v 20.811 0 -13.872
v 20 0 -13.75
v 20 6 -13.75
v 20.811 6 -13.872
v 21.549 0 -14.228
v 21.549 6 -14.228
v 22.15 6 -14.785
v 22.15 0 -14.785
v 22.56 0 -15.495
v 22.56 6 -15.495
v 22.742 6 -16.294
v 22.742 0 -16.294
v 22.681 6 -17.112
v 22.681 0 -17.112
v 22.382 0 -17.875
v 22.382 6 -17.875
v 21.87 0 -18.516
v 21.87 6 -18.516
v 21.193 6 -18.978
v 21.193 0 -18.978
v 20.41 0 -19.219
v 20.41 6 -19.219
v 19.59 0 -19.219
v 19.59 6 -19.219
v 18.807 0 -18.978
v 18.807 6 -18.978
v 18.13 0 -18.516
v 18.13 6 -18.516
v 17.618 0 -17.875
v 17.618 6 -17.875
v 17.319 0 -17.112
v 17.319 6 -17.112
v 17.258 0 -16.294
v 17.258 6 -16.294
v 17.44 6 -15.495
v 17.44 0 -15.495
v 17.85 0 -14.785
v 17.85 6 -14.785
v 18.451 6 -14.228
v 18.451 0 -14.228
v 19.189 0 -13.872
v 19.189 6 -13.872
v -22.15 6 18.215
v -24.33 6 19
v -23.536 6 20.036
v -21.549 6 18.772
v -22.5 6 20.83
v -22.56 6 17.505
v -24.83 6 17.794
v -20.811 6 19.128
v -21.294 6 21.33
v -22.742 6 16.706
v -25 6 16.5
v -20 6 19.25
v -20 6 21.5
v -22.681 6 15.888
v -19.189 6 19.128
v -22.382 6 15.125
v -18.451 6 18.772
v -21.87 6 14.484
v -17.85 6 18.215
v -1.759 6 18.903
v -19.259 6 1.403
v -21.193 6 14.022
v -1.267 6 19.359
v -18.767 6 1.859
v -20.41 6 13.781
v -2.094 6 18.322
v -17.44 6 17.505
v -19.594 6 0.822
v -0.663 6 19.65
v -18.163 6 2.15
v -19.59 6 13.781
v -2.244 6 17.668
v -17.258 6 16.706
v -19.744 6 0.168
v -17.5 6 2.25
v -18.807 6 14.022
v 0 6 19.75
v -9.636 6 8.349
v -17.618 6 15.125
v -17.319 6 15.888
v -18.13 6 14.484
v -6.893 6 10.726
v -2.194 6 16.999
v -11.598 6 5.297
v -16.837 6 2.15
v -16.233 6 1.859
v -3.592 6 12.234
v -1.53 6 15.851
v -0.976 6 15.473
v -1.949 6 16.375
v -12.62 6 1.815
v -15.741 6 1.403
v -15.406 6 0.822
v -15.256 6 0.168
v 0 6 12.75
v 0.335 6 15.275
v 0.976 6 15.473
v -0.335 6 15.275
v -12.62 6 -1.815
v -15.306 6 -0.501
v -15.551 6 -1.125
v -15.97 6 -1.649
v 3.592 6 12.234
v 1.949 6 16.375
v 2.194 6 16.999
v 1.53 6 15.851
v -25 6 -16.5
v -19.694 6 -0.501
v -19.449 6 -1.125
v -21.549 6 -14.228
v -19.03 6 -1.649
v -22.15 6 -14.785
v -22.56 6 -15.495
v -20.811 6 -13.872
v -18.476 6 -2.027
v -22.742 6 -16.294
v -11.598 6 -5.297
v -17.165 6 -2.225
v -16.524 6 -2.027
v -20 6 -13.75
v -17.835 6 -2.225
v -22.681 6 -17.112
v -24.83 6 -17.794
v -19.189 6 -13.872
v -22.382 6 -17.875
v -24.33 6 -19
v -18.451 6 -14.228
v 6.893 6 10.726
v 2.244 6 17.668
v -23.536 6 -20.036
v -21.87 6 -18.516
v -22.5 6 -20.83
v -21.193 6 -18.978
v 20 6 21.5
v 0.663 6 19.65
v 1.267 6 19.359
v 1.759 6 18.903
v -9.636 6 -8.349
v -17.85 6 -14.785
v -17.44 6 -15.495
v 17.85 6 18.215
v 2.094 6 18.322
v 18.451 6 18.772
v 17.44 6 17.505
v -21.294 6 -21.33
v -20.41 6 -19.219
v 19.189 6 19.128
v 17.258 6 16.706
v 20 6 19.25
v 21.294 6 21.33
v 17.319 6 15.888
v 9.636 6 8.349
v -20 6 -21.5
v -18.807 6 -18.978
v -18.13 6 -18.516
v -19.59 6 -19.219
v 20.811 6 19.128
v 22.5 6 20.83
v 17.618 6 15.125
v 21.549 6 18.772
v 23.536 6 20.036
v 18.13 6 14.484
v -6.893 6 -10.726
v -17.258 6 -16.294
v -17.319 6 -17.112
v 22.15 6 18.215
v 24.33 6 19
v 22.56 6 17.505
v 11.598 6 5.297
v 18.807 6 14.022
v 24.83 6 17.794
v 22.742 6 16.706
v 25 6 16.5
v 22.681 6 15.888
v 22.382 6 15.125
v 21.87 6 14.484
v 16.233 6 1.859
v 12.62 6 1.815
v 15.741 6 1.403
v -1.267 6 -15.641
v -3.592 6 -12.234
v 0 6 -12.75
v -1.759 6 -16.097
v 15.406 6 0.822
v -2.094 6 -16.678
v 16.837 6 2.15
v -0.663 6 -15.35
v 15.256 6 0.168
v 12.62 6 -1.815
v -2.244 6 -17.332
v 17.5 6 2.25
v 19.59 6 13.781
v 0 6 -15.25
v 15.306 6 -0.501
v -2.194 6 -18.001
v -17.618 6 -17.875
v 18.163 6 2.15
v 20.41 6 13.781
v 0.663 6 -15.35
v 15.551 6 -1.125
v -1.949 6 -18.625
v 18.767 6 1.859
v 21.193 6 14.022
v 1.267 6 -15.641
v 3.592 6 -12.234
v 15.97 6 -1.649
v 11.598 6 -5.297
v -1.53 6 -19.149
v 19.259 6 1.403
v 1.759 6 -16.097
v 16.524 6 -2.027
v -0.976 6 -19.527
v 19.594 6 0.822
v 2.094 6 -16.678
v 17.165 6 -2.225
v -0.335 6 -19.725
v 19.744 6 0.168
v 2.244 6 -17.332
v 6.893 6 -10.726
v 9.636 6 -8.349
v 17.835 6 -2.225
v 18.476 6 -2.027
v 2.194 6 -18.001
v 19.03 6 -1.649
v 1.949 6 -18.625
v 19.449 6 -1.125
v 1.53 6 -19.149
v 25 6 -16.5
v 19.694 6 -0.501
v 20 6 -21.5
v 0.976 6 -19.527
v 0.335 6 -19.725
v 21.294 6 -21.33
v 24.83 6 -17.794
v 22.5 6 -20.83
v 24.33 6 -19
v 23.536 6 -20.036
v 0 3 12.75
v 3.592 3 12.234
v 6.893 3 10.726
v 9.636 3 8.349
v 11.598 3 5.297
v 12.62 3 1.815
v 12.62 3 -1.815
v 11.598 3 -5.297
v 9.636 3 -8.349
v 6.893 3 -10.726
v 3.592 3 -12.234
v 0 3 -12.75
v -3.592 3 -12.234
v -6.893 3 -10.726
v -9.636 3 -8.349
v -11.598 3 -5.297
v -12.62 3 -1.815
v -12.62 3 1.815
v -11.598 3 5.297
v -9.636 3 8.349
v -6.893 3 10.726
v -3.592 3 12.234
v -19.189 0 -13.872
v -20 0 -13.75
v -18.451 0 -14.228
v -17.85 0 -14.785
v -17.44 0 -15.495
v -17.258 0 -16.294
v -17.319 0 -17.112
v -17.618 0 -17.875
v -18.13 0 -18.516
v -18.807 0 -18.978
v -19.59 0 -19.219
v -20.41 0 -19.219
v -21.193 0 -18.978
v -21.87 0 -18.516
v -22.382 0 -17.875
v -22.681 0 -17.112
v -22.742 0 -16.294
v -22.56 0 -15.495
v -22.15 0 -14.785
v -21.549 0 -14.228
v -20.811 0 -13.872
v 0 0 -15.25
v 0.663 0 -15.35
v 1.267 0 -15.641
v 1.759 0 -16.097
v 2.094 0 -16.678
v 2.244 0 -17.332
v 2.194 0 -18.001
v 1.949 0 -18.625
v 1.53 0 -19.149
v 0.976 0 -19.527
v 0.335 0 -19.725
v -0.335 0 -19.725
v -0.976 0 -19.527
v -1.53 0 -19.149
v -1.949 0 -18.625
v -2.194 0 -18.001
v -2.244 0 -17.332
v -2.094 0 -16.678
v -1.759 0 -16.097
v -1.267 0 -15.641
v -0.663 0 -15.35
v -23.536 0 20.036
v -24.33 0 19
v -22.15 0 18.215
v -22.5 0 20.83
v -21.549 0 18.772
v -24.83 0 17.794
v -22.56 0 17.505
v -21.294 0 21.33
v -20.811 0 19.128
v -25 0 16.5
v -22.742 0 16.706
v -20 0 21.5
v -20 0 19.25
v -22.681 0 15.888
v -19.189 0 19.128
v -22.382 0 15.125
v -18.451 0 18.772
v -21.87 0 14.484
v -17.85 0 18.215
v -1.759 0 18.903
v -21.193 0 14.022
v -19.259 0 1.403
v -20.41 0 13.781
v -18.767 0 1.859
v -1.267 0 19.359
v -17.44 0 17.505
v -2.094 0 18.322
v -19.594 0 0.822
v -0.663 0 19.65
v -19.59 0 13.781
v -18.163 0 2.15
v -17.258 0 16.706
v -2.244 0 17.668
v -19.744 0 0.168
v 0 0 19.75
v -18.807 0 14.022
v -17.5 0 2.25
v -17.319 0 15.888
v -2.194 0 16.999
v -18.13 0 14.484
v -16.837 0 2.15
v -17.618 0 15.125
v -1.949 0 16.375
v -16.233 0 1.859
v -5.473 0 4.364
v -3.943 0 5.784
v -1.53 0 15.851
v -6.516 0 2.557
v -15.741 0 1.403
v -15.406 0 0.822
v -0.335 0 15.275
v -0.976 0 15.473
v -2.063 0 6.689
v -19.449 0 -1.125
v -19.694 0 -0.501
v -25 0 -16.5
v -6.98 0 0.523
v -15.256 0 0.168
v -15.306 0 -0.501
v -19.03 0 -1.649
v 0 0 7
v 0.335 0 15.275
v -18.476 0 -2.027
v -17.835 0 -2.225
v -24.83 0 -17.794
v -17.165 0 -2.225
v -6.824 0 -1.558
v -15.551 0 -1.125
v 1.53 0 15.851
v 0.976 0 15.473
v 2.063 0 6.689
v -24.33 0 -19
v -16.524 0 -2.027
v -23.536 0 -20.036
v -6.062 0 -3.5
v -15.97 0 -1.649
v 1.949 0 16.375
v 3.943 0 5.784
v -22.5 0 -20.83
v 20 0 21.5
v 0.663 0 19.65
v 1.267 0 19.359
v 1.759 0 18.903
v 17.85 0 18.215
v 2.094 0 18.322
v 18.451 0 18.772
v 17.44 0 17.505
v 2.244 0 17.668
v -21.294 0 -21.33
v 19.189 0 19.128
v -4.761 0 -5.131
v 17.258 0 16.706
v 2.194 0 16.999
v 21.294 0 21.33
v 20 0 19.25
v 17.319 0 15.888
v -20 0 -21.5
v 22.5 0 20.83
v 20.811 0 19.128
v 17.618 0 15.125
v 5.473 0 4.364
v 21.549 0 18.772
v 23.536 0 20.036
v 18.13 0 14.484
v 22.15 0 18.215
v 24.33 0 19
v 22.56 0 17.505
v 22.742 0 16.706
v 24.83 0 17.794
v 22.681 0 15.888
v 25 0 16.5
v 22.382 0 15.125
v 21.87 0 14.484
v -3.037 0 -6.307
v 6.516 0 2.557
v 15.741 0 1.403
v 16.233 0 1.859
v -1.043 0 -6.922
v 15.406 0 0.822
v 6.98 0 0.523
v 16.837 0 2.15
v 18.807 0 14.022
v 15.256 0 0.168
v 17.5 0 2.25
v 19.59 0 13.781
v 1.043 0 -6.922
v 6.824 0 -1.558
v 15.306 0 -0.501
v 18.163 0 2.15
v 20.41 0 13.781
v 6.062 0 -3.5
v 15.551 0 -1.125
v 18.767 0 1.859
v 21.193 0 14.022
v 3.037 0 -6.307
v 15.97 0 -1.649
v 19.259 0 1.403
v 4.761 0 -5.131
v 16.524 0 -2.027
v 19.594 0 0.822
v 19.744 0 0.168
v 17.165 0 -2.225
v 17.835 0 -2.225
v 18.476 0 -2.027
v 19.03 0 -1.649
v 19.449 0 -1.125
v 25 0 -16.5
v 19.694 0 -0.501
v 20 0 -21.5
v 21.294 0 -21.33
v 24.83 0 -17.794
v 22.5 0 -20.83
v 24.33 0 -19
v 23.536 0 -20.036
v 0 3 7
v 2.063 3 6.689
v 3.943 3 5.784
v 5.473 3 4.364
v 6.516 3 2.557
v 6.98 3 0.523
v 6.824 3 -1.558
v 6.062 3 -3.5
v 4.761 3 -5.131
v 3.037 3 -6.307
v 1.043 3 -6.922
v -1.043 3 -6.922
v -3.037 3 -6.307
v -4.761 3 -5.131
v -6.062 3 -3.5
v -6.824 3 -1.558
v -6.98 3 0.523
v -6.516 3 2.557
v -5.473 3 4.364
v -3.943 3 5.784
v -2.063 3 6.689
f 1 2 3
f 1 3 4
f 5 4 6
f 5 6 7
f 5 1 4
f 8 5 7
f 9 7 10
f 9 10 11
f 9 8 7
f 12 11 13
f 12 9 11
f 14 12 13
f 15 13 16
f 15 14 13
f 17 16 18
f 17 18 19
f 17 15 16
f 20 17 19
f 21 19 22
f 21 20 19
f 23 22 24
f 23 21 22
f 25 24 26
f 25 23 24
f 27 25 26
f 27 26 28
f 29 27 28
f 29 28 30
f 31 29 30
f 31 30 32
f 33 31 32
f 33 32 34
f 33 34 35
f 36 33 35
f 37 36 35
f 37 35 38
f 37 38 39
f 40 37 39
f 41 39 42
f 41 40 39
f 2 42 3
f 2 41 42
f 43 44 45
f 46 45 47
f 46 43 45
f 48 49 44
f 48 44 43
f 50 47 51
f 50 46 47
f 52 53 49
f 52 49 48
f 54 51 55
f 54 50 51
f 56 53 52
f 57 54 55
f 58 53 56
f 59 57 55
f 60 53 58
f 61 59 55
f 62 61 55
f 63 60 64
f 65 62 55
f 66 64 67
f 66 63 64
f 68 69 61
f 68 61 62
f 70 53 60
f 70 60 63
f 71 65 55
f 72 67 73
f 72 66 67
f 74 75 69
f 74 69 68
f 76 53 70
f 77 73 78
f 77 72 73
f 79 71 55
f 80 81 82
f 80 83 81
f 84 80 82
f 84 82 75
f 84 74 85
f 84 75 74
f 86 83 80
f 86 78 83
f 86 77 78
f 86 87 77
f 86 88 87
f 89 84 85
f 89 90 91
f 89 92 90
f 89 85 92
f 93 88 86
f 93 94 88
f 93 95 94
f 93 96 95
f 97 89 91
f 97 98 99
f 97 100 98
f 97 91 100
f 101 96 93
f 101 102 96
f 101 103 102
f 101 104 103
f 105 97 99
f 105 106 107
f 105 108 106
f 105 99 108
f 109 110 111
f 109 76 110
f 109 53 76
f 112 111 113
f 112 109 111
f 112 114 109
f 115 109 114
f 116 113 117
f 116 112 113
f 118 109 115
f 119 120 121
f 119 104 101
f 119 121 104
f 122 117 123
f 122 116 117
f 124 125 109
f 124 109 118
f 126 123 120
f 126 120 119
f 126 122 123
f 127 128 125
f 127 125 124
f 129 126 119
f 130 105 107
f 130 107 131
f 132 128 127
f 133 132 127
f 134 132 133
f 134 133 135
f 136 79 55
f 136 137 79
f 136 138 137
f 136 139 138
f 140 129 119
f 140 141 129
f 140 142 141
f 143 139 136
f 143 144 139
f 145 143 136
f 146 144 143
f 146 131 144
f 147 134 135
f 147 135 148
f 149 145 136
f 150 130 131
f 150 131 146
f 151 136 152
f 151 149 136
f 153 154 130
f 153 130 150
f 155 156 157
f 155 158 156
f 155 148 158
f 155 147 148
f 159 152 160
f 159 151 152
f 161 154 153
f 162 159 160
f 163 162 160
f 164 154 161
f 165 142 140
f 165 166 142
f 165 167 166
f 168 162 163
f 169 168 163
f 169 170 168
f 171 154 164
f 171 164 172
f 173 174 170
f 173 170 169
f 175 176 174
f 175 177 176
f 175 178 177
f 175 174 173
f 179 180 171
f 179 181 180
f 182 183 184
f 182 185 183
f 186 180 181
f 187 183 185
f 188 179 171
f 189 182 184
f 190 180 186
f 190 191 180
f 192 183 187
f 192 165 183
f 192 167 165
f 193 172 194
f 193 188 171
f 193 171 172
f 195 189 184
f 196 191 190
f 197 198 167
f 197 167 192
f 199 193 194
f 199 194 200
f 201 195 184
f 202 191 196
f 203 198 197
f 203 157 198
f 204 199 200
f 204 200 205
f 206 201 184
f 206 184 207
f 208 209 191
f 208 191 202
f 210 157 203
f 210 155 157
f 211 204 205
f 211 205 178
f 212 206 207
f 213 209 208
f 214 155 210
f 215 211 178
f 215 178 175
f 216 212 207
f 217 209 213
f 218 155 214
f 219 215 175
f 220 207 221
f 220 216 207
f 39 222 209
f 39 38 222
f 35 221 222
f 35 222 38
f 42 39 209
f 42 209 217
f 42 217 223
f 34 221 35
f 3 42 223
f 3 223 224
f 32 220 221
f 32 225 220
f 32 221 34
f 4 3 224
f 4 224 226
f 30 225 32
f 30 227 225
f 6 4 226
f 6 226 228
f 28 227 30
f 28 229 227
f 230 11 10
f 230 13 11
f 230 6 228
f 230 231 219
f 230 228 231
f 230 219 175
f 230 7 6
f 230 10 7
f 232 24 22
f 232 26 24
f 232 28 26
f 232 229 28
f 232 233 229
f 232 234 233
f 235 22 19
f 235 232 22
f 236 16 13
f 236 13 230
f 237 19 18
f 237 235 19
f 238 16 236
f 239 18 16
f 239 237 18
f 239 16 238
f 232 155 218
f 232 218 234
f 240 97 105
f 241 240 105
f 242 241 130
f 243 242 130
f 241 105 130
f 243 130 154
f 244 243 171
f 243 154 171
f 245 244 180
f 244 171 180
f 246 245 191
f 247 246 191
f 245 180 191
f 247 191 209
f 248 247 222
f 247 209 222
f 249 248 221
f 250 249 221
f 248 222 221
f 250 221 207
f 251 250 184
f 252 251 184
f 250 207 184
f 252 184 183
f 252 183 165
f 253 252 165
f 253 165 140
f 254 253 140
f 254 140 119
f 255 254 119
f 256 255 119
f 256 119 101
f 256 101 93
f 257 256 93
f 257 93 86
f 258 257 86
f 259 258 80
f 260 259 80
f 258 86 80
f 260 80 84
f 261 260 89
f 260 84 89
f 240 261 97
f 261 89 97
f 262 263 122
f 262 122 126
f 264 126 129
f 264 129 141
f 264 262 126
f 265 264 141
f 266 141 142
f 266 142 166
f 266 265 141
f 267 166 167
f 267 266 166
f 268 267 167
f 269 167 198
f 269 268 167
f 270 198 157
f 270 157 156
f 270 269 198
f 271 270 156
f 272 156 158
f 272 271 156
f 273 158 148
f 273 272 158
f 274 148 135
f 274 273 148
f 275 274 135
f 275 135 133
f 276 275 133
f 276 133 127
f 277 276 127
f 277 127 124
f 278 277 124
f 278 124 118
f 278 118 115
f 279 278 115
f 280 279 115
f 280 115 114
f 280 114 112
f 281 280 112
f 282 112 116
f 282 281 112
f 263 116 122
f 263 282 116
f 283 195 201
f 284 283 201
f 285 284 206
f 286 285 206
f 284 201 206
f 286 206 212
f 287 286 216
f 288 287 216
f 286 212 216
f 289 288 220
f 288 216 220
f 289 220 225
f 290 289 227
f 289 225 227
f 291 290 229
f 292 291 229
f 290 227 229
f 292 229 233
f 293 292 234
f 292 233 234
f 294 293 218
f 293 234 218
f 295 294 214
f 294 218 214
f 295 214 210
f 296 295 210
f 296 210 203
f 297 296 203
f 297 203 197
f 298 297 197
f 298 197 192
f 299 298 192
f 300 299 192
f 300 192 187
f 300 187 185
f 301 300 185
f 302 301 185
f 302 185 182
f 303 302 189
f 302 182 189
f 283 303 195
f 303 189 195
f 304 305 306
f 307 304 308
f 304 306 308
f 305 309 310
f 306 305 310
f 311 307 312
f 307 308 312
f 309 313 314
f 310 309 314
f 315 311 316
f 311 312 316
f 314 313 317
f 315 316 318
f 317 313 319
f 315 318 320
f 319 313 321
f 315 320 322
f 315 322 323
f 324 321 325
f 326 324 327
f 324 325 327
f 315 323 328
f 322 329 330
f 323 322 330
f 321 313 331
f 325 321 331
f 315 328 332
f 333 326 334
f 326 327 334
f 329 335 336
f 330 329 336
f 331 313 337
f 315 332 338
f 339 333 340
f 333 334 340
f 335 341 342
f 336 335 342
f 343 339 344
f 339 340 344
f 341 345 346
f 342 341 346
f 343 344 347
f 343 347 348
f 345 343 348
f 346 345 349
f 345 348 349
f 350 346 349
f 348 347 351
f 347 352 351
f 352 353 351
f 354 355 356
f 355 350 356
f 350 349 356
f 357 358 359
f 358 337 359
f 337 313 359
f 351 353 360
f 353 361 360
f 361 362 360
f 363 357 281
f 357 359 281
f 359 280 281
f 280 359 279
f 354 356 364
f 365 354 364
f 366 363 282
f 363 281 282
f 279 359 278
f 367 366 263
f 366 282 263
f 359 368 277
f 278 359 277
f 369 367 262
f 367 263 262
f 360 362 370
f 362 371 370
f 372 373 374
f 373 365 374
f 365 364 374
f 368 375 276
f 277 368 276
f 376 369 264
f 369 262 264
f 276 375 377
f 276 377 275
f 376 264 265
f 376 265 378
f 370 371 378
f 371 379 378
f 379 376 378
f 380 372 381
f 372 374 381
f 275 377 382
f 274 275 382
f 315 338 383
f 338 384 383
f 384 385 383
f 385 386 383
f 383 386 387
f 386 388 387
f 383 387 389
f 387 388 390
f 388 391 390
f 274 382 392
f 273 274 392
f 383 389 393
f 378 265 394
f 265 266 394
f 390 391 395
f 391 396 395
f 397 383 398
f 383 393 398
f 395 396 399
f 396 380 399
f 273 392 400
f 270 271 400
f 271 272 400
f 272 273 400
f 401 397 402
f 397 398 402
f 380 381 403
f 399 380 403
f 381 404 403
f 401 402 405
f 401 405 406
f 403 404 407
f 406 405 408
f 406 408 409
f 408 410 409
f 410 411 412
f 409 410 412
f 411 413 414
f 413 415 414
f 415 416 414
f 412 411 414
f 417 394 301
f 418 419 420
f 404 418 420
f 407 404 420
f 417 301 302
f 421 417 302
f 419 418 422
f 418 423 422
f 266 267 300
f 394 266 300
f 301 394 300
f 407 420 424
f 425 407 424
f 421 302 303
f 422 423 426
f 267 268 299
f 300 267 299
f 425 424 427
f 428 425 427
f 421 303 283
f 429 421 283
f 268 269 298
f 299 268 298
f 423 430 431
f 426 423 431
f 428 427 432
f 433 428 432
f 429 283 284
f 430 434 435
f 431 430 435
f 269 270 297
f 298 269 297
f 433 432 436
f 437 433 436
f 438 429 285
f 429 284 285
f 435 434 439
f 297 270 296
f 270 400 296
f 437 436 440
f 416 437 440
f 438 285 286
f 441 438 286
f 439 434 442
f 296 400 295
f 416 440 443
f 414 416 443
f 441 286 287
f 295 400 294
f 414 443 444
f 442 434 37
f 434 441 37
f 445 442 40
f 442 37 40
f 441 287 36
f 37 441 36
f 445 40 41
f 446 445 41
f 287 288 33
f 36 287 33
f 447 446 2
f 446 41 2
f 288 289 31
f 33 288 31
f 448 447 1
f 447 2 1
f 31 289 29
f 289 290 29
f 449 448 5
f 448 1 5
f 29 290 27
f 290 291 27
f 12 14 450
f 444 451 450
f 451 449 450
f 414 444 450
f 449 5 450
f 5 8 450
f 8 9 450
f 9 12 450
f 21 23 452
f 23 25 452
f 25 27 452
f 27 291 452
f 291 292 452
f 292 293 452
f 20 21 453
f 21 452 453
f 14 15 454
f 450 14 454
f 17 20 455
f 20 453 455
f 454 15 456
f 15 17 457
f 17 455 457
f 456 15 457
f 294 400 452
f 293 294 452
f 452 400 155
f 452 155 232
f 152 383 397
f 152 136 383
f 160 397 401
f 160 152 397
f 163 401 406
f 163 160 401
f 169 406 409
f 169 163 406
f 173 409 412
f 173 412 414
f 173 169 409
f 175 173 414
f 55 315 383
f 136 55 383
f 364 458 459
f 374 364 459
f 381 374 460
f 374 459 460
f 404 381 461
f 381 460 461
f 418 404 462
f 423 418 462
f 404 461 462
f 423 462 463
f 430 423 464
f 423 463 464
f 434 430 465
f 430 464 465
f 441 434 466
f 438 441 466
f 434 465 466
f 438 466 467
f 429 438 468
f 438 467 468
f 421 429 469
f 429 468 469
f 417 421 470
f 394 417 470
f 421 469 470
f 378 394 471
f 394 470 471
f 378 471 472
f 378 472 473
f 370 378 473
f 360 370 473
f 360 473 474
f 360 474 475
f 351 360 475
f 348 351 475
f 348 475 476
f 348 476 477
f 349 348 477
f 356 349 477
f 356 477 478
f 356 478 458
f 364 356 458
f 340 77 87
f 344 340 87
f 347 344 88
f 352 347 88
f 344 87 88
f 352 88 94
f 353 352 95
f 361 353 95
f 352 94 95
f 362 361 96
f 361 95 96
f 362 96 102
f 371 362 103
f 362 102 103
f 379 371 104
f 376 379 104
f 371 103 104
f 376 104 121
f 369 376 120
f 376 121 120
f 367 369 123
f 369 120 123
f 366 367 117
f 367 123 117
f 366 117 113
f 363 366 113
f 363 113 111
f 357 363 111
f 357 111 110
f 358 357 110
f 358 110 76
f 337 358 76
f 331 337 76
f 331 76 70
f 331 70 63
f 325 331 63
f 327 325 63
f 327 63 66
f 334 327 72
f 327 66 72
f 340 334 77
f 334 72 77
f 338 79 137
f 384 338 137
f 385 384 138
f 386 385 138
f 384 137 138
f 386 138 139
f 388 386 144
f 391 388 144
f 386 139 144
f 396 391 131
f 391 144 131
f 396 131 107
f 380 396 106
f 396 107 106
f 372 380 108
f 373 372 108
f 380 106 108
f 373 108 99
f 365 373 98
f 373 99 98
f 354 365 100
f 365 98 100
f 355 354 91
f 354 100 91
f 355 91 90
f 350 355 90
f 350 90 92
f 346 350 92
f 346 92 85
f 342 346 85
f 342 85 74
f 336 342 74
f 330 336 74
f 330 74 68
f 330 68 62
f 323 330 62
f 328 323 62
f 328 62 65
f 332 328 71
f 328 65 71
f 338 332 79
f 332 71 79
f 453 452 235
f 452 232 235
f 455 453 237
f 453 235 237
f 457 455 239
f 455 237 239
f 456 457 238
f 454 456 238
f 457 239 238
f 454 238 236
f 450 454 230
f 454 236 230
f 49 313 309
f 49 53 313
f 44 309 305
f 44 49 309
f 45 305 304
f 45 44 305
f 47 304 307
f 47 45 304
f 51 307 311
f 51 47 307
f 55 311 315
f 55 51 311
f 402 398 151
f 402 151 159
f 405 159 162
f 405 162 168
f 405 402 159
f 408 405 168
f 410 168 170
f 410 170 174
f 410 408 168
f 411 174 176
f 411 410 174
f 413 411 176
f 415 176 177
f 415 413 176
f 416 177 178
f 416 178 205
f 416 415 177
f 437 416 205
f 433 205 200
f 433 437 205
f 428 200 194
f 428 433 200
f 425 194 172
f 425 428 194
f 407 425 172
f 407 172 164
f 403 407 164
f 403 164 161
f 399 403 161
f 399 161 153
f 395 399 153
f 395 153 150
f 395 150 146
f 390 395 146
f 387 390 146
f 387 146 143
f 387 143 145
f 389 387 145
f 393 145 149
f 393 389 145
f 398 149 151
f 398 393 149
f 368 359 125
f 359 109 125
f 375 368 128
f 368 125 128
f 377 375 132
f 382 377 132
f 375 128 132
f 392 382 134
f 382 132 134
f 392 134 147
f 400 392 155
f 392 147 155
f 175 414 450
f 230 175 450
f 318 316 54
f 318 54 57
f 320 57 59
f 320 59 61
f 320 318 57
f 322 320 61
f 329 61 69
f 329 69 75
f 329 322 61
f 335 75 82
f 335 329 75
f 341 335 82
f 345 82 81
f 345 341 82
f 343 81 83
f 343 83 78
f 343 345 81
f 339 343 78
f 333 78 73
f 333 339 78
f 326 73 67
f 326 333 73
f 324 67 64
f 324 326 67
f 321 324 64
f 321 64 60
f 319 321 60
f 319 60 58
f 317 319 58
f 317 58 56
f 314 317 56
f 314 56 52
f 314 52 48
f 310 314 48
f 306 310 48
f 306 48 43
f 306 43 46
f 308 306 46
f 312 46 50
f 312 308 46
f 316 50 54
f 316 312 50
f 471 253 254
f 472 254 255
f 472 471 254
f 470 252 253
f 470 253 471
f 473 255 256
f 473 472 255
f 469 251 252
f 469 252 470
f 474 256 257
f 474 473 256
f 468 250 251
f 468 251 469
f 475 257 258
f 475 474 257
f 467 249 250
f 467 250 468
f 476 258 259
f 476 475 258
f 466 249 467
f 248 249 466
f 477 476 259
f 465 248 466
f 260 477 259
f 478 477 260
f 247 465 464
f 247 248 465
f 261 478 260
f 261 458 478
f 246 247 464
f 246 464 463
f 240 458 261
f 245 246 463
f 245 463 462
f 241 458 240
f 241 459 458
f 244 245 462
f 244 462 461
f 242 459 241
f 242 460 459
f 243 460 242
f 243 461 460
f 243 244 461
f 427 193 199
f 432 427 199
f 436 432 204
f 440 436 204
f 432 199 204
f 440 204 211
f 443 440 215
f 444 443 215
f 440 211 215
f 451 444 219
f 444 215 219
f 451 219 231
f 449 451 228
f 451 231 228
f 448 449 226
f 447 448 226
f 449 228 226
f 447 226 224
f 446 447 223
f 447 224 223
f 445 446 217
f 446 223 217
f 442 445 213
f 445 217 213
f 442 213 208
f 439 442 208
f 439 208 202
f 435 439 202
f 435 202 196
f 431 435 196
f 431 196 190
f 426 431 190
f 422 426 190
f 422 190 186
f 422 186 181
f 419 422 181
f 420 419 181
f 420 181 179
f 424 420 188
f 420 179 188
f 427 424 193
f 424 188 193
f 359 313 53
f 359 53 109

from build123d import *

# Parameters (mm, degrees)
SKETCH1_W           = 50
SKETCH1_H           = 43
SKETCH1_R           = 2.75
BOSS_EXTRUDE1_DEPTH = 6
SKETCH2_R           = 7
CUT_EXTRUDE1_DEPTH  = 6
SKETCH3_R           = 2.25
CUT_EXTRUDE2_DEPTH  = 6
SKETCH4_R           = 12.75
CUT_EXTRUDE3_DEPTH  = 3
FILLET1_R           = 5


with BuildPart() as part:
    # Sketch1 → Boss-Extrude1 (new body)
    with BuildSketch(Plane(origin=(0, 0, 0), x_dir=(1, 0, 0), z_dir=(0, 1, 0))):
        Rectangle(SKETCH1_W, SKETCH1_H)
        with Locations(Location((-20, 16.5, 0), (0, 0, 270))):
            Circle(SKETCH1_R, mode=Mode.SUBTRACT)
        with Locations(Location((20, 16.5, 0), (0, 0, 270))):
            Circle(SKETCH1_R, mode=Mode.SUBTRACT)
        with Locations(Location((-20, -16.5, 0), (0, 0, 270))):
            Circle(SKETCH1_R, mode=Mode.SUBTRACT)
        with Locations(Location((20, -16.5, 0), (0, 0, 270))):
            Circle(SKETCH1_R, mode=Mode.SUBTRACT)
    extrude(amount=BOSS_EXTRUDE1_DEPTH)

    # Sketch2 → Cut-Extrude1 (cut)
    with BuildSketch(Plane(origin=(0, 6, 0), x_dir=(1, 0, 0), z_dir=(0, 1, 0))):
        with Locations(Location((0, 0, 0), (0, 0, 270))):
            Circle(SKETCH2_R)
    extrude(amount=-CUT_EXTRUDE1_DEPTH, mode=Mode.SUBTRACT)

    # Sketch3 → Cut-Extrude2 (cut)
    with BuildSketch(Plane(origin=(0, 6, 0), x_dir=(1, 0, 0), z_dir=(0, 1, 0))):
        with Locations(Location((0, 17.5, 0), (0, 0, 270))):
            Circle(SKETCH3_R)
        with Locations(Location((17.5, 0, 0), (0, 0, 270))):
            Circle(SKETCH3_R)
        with Locations(Location((0, -17.5, 0), (0, 0, 270))):
            Circle(SKETCH3_R)
        with Locations(Location((-17.5, 0, 0), (0, 0, 270))):
            Circle(SKETCH3_R)
    extrude(amount=-CUT_EXTRUDE2_DEPTH, mode=Mode.SUBTRACT)

    # Sketch4 → Cut-Extrude3 (cut)
    with BuildSketch(Plane(origin=(0, 6, 0), x_dir=(1, 0, 0), z_dir=(0, 1, 0))):
        with Locations(Location((0, 0, 0), (0, 0, 270))):
            Circle(SKETCH4_R)
    extrude(amount=-CUT_EXTRUDE3_DEPTH, mode=Mode.SUBTRACT)

    # Fillet1
    fillet1_edges = [part.edges().sort_by_distance(p)[0] for p in [
        (-25, 3, -21.5),
        (25, 3, -21.5),
        (25, 3, 21.5),
        (-25, 3, 21.5),
    ]]
    fillet(fillet1_edges, radius=FILLET1_R)


solid = part.part
